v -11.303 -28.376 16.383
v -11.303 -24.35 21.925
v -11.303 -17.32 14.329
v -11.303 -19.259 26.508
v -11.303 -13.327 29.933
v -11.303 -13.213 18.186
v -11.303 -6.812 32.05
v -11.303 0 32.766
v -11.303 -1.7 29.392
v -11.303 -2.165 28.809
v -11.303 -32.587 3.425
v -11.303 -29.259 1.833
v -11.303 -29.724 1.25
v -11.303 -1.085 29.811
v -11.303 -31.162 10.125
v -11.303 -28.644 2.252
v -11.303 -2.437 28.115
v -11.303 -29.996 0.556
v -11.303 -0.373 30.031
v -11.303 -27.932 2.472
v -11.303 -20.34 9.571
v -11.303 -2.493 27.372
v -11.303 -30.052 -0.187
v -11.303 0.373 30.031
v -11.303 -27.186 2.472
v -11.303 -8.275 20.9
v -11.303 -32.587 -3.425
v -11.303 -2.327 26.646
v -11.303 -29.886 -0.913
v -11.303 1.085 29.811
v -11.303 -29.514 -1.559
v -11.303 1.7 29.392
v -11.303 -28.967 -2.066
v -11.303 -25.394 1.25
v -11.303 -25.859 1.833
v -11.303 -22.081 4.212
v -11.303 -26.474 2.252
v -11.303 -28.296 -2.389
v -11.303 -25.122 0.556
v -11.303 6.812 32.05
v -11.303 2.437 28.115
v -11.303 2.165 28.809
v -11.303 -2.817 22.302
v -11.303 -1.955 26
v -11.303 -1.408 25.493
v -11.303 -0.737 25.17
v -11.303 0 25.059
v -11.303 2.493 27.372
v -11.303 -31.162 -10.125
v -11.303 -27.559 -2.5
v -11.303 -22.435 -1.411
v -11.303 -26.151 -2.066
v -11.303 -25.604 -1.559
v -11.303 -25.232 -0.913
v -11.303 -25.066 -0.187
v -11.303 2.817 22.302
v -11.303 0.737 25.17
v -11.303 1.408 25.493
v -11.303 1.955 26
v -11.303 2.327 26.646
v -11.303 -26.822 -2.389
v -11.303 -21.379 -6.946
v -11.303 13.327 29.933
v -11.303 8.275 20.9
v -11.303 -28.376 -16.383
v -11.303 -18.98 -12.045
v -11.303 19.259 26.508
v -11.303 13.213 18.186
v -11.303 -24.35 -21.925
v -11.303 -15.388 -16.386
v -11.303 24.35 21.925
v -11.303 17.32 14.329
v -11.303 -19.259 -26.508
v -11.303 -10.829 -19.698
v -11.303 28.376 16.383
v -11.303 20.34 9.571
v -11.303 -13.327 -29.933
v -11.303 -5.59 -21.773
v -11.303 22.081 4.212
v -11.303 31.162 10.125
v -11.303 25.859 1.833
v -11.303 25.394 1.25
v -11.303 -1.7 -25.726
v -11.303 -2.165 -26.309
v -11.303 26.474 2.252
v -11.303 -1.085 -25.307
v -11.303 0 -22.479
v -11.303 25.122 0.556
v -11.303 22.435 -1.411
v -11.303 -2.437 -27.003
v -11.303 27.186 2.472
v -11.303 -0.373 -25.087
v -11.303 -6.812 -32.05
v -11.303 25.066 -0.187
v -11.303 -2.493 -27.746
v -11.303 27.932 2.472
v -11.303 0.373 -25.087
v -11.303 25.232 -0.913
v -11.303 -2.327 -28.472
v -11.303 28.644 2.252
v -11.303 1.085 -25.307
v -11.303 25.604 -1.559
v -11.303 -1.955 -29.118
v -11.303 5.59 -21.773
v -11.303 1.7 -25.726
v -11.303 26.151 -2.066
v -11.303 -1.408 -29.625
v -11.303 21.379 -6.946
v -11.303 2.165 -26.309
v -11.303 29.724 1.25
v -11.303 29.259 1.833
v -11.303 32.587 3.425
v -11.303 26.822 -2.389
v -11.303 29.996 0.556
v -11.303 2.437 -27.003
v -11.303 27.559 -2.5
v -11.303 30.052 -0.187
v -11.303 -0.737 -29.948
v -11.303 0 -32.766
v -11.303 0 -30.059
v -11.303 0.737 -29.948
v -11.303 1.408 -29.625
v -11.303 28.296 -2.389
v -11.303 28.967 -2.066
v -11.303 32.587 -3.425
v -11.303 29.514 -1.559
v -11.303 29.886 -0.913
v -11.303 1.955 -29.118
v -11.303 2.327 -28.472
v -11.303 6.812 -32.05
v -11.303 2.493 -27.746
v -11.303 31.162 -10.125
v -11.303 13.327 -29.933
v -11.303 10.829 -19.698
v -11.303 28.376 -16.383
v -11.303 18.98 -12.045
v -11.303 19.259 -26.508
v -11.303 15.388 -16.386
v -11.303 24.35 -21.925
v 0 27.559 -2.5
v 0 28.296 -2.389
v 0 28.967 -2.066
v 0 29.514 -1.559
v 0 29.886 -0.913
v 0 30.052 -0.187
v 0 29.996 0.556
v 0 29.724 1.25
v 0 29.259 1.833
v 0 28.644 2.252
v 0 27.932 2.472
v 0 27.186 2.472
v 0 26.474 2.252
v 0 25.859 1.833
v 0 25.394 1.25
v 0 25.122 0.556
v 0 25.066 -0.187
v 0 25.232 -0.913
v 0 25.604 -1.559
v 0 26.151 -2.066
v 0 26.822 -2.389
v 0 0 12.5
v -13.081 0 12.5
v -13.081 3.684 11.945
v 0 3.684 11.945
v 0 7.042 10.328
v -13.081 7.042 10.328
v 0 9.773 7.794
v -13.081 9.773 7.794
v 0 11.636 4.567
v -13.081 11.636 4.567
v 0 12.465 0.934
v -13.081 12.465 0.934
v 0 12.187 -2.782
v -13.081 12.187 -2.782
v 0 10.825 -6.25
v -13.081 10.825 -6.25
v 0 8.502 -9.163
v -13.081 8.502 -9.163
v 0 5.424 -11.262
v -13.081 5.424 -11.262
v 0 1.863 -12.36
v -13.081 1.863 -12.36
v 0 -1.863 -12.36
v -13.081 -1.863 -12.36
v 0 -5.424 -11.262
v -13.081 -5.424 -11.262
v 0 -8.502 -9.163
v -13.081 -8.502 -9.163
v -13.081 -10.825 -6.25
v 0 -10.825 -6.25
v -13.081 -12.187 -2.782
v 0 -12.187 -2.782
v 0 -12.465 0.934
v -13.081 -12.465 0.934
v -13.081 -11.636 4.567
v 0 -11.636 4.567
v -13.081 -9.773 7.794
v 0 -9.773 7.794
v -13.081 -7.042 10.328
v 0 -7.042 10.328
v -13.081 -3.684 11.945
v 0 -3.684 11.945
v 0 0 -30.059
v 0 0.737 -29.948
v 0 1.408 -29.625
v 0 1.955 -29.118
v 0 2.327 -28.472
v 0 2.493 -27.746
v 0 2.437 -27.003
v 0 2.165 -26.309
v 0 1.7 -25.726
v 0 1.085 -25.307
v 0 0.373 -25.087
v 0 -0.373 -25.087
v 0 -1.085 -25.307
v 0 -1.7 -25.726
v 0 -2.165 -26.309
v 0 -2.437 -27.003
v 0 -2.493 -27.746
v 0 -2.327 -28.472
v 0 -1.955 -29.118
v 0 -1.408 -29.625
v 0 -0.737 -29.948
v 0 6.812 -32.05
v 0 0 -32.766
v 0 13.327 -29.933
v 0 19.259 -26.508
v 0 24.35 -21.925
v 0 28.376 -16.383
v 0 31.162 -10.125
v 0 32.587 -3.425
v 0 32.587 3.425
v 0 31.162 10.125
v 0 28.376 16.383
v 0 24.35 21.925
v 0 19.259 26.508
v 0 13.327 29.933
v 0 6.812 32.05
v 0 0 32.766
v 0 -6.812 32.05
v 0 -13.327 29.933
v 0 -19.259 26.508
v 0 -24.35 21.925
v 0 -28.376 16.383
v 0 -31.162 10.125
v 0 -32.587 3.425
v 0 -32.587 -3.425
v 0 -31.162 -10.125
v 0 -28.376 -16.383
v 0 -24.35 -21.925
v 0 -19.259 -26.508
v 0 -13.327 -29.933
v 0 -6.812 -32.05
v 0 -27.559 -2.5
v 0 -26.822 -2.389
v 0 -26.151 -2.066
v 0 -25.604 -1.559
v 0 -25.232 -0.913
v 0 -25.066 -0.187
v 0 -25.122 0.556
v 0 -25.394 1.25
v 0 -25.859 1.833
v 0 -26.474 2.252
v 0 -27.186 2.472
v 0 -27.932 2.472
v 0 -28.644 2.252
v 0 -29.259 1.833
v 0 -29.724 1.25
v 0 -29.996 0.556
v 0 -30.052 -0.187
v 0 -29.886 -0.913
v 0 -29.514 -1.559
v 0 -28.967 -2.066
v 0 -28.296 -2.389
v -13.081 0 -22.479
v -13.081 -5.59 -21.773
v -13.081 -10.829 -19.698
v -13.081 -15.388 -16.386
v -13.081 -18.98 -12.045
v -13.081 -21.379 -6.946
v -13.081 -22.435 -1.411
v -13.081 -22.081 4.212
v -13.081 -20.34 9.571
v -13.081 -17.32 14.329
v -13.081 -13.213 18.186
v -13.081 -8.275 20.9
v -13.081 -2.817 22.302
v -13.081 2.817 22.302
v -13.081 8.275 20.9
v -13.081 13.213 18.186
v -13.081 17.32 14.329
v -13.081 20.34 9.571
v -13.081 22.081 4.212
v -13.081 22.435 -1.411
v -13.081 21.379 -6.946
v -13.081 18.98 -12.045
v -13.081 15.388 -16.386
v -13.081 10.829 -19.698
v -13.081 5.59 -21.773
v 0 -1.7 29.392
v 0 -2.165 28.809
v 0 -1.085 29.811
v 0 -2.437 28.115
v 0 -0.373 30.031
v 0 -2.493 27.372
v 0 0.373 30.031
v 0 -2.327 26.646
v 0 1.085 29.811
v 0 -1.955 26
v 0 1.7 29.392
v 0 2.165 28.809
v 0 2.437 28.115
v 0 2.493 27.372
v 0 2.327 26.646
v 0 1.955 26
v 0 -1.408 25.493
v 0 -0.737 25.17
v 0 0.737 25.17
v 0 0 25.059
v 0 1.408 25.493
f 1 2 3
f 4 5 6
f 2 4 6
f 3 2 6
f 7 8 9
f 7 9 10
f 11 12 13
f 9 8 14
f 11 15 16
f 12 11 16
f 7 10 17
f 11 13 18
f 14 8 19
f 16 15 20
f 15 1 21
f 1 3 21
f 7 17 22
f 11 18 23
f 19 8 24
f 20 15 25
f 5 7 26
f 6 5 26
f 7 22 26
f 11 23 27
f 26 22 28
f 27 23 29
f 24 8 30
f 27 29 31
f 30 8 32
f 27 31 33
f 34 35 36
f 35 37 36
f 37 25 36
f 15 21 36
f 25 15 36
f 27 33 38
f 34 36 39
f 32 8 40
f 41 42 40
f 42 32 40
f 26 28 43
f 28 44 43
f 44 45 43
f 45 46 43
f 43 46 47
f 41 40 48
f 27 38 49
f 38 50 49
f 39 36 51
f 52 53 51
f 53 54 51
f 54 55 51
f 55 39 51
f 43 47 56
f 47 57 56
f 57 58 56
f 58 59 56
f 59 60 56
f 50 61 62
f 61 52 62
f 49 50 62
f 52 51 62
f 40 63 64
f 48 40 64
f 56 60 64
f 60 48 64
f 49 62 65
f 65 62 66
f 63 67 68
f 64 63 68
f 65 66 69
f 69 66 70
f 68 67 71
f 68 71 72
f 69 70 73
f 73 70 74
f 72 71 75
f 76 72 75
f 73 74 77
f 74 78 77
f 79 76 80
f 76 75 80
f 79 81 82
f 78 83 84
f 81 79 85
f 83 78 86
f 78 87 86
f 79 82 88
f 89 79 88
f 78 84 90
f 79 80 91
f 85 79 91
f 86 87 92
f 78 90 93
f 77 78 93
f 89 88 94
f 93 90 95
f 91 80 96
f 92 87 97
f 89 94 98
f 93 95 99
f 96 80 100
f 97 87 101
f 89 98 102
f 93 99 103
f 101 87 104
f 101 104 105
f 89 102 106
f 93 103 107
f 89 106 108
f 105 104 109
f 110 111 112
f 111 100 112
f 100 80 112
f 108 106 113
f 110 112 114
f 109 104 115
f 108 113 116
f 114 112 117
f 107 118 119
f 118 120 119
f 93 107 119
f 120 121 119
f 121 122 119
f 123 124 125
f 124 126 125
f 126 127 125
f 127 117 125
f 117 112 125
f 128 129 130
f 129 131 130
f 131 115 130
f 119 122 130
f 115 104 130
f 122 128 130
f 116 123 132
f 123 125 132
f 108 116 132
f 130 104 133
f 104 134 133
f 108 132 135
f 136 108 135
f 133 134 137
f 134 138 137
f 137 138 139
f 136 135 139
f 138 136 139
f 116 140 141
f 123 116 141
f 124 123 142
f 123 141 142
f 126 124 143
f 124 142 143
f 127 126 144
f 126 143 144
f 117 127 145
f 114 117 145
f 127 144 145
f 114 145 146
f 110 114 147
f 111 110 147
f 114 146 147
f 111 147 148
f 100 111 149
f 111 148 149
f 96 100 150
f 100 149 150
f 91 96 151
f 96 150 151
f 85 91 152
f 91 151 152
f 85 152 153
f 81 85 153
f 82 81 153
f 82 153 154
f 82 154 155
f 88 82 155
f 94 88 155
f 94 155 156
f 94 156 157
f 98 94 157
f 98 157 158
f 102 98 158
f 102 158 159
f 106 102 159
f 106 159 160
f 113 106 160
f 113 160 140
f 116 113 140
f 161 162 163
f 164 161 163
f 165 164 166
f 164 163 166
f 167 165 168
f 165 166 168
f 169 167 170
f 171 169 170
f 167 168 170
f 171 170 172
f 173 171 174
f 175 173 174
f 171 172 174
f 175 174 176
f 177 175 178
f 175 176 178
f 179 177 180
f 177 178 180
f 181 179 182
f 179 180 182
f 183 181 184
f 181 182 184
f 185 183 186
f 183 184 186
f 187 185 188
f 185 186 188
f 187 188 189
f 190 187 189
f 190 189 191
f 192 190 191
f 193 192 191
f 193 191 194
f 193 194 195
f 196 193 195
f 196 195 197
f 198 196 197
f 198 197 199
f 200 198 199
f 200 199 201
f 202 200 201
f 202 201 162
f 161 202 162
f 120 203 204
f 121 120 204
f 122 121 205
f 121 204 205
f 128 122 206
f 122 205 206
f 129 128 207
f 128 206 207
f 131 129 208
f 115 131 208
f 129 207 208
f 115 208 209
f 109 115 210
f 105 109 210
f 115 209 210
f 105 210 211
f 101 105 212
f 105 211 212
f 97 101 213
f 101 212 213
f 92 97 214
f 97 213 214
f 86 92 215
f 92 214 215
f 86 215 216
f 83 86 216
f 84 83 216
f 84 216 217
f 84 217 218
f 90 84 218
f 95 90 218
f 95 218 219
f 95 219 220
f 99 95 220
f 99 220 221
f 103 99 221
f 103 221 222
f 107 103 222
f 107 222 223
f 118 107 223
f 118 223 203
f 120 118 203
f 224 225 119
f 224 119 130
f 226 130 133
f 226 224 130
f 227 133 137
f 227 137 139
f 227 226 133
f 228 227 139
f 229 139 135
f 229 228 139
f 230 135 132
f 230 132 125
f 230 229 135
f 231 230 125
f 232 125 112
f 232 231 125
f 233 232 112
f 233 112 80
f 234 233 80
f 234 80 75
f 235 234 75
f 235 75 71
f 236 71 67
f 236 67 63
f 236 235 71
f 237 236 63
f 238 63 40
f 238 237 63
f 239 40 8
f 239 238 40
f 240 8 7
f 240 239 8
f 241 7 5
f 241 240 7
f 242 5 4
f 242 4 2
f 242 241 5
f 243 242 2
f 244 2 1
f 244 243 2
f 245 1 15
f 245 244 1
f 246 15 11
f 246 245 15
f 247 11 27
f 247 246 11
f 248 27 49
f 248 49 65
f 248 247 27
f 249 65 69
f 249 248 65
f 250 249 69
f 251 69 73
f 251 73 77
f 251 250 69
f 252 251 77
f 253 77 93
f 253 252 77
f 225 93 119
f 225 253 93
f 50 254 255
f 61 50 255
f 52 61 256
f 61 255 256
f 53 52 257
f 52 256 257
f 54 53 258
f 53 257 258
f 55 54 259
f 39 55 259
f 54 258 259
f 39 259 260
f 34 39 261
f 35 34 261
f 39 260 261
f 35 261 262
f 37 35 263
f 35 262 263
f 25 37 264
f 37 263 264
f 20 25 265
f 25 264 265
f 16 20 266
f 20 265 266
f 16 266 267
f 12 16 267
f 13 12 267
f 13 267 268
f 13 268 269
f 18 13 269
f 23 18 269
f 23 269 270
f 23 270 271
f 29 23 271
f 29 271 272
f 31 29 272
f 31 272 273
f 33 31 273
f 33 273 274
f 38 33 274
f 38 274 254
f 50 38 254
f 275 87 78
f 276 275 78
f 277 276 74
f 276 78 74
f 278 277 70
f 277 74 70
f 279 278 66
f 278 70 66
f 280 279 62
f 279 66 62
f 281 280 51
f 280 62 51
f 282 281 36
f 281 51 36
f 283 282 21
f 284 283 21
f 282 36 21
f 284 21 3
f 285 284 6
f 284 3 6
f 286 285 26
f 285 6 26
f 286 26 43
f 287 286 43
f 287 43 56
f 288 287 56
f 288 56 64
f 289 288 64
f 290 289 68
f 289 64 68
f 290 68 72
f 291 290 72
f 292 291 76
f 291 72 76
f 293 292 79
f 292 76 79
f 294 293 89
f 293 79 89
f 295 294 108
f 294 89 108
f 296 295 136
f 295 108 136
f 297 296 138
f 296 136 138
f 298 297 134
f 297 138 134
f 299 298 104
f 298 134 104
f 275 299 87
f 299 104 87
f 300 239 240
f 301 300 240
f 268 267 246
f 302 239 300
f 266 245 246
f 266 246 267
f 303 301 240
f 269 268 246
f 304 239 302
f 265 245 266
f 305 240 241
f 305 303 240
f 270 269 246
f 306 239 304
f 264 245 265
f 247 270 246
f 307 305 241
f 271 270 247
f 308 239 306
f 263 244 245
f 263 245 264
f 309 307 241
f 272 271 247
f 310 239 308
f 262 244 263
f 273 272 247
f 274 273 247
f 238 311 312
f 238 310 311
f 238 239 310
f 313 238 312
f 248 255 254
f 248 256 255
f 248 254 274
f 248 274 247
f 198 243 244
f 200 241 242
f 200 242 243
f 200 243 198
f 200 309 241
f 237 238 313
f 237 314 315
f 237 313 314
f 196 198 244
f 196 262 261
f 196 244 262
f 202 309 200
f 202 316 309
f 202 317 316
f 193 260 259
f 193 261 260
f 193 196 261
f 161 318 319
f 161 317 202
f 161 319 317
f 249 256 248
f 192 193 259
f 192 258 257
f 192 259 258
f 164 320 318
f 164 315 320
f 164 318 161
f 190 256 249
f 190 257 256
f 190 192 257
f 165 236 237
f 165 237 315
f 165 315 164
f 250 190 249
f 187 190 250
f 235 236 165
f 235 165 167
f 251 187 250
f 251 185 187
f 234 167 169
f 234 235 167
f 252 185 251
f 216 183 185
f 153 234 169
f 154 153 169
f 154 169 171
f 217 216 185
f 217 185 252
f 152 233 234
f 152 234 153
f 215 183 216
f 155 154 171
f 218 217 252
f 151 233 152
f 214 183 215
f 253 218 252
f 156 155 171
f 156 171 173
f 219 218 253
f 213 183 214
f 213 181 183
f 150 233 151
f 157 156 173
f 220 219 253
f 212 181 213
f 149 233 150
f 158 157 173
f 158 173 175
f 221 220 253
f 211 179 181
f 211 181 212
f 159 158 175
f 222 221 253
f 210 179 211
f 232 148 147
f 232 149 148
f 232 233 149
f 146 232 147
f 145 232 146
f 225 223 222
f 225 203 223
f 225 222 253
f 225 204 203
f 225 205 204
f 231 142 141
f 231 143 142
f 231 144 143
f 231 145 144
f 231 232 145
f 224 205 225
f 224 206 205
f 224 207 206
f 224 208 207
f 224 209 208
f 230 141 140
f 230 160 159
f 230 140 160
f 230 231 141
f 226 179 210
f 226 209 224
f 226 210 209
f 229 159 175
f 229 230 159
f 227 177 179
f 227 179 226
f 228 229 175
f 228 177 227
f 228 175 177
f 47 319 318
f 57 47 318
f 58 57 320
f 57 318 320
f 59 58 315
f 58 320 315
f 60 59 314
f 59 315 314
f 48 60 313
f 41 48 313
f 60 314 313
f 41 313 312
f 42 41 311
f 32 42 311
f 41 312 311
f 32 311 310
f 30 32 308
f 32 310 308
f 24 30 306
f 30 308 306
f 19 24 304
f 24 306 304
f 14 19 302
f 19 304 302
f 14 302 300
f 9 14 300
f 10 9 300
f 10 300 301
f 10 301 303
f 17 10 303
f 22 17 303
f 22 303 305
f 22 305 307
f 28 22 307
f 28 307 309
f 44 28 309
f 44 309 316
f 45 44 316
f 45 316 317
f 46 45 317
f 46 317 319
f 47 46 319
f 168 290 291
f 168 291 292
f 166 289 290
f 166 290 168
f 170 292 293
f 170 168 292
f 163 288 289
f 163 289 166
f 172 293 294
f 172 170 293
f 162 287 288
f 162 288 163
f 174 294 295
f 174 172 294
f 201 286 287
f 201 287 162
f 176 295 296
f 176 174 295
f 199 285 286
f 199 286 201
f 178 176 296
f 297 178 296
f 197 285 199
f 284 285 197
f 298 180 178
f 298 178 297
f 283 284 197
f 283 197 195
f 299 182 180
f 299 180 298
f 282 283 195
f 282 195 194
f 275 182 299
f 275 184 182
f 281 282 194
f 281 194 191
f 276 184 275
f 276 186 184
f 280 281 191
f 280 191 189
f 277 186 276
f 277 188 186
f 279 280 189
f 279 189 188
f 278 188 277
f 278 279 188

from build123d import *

# Parameters (mm, degrees)
SKETCH1_R             = 32.766
BOSS_EXTRUDE1_DEPTH   = 11.303
SKETCH2_R             = 22.479
BOSS_EXTRUDE2_DEPTH   = 1.778
SKETCH3_R             = 12.5
CUT_EXTRUDE1_DEPTH    = 49.149081746
M6_TAPPED_HOLE1_D     = 5
M6_TAPPED_HOLE1_DEPTH = 12.446
M6_TAPPED_HOLE1_TIP   = 1.502151548


with BuildPart() as part:
    # Sketch1 → Boss-Extrude1 (new body)
    with BuildSketch(Plane(origin=(0, 0, 0), x_dir=(0, 0, -1), z_dir=(1, 0, 0))):
        Circle(SKETCH1_R)
    extrude(amount=-BOSS_EXTRUDE1_DEPTH)

    # Sketch2 → Boss-Extrude2 (add)
    with BuildSketch(Plane.ZY.offset(11.303)):
        with Locations(Location((0, 0, 0), (0, 0, 180))):
            Circle(SKETCH2_R)
    extrude(amount=BOSS_EXTRUDE2_DEPTH)

    # Sketch3 → Cut-Extrude1 (cut, through all)
    with BuildSketch(Plane.ZY.offset(13.081)):
        Circle(SKETCH3_R)
    extrude(amount=-CUT_EXTRUDE1_DEPTH, mode=Mode.SUBTRACT)

    # M6 Tapped Hole1
    with Locations(Plane.ZY.offset(11.303)):
        with Locations((0, 27.559), (27.559, 0), (0, -27.559), (-27.559, 0)):
            Hole(M6_TAPPED_HOLE1_D / 2, depth=M6_TAPPED_HOLE1_DEPTH)
            with Locations((0, 0, -(M6_TAPPED_HOLE1_DEPTH + M6_TAPPED_HOLE1_TIP / 2))):  # 118° drill point
                Cone(0, M6_TAPPED_HOLE1_D / 2, M6_TAPPED_HOLE1_TIP, mode=Mode.SUBTRACT)


solid = part.part
